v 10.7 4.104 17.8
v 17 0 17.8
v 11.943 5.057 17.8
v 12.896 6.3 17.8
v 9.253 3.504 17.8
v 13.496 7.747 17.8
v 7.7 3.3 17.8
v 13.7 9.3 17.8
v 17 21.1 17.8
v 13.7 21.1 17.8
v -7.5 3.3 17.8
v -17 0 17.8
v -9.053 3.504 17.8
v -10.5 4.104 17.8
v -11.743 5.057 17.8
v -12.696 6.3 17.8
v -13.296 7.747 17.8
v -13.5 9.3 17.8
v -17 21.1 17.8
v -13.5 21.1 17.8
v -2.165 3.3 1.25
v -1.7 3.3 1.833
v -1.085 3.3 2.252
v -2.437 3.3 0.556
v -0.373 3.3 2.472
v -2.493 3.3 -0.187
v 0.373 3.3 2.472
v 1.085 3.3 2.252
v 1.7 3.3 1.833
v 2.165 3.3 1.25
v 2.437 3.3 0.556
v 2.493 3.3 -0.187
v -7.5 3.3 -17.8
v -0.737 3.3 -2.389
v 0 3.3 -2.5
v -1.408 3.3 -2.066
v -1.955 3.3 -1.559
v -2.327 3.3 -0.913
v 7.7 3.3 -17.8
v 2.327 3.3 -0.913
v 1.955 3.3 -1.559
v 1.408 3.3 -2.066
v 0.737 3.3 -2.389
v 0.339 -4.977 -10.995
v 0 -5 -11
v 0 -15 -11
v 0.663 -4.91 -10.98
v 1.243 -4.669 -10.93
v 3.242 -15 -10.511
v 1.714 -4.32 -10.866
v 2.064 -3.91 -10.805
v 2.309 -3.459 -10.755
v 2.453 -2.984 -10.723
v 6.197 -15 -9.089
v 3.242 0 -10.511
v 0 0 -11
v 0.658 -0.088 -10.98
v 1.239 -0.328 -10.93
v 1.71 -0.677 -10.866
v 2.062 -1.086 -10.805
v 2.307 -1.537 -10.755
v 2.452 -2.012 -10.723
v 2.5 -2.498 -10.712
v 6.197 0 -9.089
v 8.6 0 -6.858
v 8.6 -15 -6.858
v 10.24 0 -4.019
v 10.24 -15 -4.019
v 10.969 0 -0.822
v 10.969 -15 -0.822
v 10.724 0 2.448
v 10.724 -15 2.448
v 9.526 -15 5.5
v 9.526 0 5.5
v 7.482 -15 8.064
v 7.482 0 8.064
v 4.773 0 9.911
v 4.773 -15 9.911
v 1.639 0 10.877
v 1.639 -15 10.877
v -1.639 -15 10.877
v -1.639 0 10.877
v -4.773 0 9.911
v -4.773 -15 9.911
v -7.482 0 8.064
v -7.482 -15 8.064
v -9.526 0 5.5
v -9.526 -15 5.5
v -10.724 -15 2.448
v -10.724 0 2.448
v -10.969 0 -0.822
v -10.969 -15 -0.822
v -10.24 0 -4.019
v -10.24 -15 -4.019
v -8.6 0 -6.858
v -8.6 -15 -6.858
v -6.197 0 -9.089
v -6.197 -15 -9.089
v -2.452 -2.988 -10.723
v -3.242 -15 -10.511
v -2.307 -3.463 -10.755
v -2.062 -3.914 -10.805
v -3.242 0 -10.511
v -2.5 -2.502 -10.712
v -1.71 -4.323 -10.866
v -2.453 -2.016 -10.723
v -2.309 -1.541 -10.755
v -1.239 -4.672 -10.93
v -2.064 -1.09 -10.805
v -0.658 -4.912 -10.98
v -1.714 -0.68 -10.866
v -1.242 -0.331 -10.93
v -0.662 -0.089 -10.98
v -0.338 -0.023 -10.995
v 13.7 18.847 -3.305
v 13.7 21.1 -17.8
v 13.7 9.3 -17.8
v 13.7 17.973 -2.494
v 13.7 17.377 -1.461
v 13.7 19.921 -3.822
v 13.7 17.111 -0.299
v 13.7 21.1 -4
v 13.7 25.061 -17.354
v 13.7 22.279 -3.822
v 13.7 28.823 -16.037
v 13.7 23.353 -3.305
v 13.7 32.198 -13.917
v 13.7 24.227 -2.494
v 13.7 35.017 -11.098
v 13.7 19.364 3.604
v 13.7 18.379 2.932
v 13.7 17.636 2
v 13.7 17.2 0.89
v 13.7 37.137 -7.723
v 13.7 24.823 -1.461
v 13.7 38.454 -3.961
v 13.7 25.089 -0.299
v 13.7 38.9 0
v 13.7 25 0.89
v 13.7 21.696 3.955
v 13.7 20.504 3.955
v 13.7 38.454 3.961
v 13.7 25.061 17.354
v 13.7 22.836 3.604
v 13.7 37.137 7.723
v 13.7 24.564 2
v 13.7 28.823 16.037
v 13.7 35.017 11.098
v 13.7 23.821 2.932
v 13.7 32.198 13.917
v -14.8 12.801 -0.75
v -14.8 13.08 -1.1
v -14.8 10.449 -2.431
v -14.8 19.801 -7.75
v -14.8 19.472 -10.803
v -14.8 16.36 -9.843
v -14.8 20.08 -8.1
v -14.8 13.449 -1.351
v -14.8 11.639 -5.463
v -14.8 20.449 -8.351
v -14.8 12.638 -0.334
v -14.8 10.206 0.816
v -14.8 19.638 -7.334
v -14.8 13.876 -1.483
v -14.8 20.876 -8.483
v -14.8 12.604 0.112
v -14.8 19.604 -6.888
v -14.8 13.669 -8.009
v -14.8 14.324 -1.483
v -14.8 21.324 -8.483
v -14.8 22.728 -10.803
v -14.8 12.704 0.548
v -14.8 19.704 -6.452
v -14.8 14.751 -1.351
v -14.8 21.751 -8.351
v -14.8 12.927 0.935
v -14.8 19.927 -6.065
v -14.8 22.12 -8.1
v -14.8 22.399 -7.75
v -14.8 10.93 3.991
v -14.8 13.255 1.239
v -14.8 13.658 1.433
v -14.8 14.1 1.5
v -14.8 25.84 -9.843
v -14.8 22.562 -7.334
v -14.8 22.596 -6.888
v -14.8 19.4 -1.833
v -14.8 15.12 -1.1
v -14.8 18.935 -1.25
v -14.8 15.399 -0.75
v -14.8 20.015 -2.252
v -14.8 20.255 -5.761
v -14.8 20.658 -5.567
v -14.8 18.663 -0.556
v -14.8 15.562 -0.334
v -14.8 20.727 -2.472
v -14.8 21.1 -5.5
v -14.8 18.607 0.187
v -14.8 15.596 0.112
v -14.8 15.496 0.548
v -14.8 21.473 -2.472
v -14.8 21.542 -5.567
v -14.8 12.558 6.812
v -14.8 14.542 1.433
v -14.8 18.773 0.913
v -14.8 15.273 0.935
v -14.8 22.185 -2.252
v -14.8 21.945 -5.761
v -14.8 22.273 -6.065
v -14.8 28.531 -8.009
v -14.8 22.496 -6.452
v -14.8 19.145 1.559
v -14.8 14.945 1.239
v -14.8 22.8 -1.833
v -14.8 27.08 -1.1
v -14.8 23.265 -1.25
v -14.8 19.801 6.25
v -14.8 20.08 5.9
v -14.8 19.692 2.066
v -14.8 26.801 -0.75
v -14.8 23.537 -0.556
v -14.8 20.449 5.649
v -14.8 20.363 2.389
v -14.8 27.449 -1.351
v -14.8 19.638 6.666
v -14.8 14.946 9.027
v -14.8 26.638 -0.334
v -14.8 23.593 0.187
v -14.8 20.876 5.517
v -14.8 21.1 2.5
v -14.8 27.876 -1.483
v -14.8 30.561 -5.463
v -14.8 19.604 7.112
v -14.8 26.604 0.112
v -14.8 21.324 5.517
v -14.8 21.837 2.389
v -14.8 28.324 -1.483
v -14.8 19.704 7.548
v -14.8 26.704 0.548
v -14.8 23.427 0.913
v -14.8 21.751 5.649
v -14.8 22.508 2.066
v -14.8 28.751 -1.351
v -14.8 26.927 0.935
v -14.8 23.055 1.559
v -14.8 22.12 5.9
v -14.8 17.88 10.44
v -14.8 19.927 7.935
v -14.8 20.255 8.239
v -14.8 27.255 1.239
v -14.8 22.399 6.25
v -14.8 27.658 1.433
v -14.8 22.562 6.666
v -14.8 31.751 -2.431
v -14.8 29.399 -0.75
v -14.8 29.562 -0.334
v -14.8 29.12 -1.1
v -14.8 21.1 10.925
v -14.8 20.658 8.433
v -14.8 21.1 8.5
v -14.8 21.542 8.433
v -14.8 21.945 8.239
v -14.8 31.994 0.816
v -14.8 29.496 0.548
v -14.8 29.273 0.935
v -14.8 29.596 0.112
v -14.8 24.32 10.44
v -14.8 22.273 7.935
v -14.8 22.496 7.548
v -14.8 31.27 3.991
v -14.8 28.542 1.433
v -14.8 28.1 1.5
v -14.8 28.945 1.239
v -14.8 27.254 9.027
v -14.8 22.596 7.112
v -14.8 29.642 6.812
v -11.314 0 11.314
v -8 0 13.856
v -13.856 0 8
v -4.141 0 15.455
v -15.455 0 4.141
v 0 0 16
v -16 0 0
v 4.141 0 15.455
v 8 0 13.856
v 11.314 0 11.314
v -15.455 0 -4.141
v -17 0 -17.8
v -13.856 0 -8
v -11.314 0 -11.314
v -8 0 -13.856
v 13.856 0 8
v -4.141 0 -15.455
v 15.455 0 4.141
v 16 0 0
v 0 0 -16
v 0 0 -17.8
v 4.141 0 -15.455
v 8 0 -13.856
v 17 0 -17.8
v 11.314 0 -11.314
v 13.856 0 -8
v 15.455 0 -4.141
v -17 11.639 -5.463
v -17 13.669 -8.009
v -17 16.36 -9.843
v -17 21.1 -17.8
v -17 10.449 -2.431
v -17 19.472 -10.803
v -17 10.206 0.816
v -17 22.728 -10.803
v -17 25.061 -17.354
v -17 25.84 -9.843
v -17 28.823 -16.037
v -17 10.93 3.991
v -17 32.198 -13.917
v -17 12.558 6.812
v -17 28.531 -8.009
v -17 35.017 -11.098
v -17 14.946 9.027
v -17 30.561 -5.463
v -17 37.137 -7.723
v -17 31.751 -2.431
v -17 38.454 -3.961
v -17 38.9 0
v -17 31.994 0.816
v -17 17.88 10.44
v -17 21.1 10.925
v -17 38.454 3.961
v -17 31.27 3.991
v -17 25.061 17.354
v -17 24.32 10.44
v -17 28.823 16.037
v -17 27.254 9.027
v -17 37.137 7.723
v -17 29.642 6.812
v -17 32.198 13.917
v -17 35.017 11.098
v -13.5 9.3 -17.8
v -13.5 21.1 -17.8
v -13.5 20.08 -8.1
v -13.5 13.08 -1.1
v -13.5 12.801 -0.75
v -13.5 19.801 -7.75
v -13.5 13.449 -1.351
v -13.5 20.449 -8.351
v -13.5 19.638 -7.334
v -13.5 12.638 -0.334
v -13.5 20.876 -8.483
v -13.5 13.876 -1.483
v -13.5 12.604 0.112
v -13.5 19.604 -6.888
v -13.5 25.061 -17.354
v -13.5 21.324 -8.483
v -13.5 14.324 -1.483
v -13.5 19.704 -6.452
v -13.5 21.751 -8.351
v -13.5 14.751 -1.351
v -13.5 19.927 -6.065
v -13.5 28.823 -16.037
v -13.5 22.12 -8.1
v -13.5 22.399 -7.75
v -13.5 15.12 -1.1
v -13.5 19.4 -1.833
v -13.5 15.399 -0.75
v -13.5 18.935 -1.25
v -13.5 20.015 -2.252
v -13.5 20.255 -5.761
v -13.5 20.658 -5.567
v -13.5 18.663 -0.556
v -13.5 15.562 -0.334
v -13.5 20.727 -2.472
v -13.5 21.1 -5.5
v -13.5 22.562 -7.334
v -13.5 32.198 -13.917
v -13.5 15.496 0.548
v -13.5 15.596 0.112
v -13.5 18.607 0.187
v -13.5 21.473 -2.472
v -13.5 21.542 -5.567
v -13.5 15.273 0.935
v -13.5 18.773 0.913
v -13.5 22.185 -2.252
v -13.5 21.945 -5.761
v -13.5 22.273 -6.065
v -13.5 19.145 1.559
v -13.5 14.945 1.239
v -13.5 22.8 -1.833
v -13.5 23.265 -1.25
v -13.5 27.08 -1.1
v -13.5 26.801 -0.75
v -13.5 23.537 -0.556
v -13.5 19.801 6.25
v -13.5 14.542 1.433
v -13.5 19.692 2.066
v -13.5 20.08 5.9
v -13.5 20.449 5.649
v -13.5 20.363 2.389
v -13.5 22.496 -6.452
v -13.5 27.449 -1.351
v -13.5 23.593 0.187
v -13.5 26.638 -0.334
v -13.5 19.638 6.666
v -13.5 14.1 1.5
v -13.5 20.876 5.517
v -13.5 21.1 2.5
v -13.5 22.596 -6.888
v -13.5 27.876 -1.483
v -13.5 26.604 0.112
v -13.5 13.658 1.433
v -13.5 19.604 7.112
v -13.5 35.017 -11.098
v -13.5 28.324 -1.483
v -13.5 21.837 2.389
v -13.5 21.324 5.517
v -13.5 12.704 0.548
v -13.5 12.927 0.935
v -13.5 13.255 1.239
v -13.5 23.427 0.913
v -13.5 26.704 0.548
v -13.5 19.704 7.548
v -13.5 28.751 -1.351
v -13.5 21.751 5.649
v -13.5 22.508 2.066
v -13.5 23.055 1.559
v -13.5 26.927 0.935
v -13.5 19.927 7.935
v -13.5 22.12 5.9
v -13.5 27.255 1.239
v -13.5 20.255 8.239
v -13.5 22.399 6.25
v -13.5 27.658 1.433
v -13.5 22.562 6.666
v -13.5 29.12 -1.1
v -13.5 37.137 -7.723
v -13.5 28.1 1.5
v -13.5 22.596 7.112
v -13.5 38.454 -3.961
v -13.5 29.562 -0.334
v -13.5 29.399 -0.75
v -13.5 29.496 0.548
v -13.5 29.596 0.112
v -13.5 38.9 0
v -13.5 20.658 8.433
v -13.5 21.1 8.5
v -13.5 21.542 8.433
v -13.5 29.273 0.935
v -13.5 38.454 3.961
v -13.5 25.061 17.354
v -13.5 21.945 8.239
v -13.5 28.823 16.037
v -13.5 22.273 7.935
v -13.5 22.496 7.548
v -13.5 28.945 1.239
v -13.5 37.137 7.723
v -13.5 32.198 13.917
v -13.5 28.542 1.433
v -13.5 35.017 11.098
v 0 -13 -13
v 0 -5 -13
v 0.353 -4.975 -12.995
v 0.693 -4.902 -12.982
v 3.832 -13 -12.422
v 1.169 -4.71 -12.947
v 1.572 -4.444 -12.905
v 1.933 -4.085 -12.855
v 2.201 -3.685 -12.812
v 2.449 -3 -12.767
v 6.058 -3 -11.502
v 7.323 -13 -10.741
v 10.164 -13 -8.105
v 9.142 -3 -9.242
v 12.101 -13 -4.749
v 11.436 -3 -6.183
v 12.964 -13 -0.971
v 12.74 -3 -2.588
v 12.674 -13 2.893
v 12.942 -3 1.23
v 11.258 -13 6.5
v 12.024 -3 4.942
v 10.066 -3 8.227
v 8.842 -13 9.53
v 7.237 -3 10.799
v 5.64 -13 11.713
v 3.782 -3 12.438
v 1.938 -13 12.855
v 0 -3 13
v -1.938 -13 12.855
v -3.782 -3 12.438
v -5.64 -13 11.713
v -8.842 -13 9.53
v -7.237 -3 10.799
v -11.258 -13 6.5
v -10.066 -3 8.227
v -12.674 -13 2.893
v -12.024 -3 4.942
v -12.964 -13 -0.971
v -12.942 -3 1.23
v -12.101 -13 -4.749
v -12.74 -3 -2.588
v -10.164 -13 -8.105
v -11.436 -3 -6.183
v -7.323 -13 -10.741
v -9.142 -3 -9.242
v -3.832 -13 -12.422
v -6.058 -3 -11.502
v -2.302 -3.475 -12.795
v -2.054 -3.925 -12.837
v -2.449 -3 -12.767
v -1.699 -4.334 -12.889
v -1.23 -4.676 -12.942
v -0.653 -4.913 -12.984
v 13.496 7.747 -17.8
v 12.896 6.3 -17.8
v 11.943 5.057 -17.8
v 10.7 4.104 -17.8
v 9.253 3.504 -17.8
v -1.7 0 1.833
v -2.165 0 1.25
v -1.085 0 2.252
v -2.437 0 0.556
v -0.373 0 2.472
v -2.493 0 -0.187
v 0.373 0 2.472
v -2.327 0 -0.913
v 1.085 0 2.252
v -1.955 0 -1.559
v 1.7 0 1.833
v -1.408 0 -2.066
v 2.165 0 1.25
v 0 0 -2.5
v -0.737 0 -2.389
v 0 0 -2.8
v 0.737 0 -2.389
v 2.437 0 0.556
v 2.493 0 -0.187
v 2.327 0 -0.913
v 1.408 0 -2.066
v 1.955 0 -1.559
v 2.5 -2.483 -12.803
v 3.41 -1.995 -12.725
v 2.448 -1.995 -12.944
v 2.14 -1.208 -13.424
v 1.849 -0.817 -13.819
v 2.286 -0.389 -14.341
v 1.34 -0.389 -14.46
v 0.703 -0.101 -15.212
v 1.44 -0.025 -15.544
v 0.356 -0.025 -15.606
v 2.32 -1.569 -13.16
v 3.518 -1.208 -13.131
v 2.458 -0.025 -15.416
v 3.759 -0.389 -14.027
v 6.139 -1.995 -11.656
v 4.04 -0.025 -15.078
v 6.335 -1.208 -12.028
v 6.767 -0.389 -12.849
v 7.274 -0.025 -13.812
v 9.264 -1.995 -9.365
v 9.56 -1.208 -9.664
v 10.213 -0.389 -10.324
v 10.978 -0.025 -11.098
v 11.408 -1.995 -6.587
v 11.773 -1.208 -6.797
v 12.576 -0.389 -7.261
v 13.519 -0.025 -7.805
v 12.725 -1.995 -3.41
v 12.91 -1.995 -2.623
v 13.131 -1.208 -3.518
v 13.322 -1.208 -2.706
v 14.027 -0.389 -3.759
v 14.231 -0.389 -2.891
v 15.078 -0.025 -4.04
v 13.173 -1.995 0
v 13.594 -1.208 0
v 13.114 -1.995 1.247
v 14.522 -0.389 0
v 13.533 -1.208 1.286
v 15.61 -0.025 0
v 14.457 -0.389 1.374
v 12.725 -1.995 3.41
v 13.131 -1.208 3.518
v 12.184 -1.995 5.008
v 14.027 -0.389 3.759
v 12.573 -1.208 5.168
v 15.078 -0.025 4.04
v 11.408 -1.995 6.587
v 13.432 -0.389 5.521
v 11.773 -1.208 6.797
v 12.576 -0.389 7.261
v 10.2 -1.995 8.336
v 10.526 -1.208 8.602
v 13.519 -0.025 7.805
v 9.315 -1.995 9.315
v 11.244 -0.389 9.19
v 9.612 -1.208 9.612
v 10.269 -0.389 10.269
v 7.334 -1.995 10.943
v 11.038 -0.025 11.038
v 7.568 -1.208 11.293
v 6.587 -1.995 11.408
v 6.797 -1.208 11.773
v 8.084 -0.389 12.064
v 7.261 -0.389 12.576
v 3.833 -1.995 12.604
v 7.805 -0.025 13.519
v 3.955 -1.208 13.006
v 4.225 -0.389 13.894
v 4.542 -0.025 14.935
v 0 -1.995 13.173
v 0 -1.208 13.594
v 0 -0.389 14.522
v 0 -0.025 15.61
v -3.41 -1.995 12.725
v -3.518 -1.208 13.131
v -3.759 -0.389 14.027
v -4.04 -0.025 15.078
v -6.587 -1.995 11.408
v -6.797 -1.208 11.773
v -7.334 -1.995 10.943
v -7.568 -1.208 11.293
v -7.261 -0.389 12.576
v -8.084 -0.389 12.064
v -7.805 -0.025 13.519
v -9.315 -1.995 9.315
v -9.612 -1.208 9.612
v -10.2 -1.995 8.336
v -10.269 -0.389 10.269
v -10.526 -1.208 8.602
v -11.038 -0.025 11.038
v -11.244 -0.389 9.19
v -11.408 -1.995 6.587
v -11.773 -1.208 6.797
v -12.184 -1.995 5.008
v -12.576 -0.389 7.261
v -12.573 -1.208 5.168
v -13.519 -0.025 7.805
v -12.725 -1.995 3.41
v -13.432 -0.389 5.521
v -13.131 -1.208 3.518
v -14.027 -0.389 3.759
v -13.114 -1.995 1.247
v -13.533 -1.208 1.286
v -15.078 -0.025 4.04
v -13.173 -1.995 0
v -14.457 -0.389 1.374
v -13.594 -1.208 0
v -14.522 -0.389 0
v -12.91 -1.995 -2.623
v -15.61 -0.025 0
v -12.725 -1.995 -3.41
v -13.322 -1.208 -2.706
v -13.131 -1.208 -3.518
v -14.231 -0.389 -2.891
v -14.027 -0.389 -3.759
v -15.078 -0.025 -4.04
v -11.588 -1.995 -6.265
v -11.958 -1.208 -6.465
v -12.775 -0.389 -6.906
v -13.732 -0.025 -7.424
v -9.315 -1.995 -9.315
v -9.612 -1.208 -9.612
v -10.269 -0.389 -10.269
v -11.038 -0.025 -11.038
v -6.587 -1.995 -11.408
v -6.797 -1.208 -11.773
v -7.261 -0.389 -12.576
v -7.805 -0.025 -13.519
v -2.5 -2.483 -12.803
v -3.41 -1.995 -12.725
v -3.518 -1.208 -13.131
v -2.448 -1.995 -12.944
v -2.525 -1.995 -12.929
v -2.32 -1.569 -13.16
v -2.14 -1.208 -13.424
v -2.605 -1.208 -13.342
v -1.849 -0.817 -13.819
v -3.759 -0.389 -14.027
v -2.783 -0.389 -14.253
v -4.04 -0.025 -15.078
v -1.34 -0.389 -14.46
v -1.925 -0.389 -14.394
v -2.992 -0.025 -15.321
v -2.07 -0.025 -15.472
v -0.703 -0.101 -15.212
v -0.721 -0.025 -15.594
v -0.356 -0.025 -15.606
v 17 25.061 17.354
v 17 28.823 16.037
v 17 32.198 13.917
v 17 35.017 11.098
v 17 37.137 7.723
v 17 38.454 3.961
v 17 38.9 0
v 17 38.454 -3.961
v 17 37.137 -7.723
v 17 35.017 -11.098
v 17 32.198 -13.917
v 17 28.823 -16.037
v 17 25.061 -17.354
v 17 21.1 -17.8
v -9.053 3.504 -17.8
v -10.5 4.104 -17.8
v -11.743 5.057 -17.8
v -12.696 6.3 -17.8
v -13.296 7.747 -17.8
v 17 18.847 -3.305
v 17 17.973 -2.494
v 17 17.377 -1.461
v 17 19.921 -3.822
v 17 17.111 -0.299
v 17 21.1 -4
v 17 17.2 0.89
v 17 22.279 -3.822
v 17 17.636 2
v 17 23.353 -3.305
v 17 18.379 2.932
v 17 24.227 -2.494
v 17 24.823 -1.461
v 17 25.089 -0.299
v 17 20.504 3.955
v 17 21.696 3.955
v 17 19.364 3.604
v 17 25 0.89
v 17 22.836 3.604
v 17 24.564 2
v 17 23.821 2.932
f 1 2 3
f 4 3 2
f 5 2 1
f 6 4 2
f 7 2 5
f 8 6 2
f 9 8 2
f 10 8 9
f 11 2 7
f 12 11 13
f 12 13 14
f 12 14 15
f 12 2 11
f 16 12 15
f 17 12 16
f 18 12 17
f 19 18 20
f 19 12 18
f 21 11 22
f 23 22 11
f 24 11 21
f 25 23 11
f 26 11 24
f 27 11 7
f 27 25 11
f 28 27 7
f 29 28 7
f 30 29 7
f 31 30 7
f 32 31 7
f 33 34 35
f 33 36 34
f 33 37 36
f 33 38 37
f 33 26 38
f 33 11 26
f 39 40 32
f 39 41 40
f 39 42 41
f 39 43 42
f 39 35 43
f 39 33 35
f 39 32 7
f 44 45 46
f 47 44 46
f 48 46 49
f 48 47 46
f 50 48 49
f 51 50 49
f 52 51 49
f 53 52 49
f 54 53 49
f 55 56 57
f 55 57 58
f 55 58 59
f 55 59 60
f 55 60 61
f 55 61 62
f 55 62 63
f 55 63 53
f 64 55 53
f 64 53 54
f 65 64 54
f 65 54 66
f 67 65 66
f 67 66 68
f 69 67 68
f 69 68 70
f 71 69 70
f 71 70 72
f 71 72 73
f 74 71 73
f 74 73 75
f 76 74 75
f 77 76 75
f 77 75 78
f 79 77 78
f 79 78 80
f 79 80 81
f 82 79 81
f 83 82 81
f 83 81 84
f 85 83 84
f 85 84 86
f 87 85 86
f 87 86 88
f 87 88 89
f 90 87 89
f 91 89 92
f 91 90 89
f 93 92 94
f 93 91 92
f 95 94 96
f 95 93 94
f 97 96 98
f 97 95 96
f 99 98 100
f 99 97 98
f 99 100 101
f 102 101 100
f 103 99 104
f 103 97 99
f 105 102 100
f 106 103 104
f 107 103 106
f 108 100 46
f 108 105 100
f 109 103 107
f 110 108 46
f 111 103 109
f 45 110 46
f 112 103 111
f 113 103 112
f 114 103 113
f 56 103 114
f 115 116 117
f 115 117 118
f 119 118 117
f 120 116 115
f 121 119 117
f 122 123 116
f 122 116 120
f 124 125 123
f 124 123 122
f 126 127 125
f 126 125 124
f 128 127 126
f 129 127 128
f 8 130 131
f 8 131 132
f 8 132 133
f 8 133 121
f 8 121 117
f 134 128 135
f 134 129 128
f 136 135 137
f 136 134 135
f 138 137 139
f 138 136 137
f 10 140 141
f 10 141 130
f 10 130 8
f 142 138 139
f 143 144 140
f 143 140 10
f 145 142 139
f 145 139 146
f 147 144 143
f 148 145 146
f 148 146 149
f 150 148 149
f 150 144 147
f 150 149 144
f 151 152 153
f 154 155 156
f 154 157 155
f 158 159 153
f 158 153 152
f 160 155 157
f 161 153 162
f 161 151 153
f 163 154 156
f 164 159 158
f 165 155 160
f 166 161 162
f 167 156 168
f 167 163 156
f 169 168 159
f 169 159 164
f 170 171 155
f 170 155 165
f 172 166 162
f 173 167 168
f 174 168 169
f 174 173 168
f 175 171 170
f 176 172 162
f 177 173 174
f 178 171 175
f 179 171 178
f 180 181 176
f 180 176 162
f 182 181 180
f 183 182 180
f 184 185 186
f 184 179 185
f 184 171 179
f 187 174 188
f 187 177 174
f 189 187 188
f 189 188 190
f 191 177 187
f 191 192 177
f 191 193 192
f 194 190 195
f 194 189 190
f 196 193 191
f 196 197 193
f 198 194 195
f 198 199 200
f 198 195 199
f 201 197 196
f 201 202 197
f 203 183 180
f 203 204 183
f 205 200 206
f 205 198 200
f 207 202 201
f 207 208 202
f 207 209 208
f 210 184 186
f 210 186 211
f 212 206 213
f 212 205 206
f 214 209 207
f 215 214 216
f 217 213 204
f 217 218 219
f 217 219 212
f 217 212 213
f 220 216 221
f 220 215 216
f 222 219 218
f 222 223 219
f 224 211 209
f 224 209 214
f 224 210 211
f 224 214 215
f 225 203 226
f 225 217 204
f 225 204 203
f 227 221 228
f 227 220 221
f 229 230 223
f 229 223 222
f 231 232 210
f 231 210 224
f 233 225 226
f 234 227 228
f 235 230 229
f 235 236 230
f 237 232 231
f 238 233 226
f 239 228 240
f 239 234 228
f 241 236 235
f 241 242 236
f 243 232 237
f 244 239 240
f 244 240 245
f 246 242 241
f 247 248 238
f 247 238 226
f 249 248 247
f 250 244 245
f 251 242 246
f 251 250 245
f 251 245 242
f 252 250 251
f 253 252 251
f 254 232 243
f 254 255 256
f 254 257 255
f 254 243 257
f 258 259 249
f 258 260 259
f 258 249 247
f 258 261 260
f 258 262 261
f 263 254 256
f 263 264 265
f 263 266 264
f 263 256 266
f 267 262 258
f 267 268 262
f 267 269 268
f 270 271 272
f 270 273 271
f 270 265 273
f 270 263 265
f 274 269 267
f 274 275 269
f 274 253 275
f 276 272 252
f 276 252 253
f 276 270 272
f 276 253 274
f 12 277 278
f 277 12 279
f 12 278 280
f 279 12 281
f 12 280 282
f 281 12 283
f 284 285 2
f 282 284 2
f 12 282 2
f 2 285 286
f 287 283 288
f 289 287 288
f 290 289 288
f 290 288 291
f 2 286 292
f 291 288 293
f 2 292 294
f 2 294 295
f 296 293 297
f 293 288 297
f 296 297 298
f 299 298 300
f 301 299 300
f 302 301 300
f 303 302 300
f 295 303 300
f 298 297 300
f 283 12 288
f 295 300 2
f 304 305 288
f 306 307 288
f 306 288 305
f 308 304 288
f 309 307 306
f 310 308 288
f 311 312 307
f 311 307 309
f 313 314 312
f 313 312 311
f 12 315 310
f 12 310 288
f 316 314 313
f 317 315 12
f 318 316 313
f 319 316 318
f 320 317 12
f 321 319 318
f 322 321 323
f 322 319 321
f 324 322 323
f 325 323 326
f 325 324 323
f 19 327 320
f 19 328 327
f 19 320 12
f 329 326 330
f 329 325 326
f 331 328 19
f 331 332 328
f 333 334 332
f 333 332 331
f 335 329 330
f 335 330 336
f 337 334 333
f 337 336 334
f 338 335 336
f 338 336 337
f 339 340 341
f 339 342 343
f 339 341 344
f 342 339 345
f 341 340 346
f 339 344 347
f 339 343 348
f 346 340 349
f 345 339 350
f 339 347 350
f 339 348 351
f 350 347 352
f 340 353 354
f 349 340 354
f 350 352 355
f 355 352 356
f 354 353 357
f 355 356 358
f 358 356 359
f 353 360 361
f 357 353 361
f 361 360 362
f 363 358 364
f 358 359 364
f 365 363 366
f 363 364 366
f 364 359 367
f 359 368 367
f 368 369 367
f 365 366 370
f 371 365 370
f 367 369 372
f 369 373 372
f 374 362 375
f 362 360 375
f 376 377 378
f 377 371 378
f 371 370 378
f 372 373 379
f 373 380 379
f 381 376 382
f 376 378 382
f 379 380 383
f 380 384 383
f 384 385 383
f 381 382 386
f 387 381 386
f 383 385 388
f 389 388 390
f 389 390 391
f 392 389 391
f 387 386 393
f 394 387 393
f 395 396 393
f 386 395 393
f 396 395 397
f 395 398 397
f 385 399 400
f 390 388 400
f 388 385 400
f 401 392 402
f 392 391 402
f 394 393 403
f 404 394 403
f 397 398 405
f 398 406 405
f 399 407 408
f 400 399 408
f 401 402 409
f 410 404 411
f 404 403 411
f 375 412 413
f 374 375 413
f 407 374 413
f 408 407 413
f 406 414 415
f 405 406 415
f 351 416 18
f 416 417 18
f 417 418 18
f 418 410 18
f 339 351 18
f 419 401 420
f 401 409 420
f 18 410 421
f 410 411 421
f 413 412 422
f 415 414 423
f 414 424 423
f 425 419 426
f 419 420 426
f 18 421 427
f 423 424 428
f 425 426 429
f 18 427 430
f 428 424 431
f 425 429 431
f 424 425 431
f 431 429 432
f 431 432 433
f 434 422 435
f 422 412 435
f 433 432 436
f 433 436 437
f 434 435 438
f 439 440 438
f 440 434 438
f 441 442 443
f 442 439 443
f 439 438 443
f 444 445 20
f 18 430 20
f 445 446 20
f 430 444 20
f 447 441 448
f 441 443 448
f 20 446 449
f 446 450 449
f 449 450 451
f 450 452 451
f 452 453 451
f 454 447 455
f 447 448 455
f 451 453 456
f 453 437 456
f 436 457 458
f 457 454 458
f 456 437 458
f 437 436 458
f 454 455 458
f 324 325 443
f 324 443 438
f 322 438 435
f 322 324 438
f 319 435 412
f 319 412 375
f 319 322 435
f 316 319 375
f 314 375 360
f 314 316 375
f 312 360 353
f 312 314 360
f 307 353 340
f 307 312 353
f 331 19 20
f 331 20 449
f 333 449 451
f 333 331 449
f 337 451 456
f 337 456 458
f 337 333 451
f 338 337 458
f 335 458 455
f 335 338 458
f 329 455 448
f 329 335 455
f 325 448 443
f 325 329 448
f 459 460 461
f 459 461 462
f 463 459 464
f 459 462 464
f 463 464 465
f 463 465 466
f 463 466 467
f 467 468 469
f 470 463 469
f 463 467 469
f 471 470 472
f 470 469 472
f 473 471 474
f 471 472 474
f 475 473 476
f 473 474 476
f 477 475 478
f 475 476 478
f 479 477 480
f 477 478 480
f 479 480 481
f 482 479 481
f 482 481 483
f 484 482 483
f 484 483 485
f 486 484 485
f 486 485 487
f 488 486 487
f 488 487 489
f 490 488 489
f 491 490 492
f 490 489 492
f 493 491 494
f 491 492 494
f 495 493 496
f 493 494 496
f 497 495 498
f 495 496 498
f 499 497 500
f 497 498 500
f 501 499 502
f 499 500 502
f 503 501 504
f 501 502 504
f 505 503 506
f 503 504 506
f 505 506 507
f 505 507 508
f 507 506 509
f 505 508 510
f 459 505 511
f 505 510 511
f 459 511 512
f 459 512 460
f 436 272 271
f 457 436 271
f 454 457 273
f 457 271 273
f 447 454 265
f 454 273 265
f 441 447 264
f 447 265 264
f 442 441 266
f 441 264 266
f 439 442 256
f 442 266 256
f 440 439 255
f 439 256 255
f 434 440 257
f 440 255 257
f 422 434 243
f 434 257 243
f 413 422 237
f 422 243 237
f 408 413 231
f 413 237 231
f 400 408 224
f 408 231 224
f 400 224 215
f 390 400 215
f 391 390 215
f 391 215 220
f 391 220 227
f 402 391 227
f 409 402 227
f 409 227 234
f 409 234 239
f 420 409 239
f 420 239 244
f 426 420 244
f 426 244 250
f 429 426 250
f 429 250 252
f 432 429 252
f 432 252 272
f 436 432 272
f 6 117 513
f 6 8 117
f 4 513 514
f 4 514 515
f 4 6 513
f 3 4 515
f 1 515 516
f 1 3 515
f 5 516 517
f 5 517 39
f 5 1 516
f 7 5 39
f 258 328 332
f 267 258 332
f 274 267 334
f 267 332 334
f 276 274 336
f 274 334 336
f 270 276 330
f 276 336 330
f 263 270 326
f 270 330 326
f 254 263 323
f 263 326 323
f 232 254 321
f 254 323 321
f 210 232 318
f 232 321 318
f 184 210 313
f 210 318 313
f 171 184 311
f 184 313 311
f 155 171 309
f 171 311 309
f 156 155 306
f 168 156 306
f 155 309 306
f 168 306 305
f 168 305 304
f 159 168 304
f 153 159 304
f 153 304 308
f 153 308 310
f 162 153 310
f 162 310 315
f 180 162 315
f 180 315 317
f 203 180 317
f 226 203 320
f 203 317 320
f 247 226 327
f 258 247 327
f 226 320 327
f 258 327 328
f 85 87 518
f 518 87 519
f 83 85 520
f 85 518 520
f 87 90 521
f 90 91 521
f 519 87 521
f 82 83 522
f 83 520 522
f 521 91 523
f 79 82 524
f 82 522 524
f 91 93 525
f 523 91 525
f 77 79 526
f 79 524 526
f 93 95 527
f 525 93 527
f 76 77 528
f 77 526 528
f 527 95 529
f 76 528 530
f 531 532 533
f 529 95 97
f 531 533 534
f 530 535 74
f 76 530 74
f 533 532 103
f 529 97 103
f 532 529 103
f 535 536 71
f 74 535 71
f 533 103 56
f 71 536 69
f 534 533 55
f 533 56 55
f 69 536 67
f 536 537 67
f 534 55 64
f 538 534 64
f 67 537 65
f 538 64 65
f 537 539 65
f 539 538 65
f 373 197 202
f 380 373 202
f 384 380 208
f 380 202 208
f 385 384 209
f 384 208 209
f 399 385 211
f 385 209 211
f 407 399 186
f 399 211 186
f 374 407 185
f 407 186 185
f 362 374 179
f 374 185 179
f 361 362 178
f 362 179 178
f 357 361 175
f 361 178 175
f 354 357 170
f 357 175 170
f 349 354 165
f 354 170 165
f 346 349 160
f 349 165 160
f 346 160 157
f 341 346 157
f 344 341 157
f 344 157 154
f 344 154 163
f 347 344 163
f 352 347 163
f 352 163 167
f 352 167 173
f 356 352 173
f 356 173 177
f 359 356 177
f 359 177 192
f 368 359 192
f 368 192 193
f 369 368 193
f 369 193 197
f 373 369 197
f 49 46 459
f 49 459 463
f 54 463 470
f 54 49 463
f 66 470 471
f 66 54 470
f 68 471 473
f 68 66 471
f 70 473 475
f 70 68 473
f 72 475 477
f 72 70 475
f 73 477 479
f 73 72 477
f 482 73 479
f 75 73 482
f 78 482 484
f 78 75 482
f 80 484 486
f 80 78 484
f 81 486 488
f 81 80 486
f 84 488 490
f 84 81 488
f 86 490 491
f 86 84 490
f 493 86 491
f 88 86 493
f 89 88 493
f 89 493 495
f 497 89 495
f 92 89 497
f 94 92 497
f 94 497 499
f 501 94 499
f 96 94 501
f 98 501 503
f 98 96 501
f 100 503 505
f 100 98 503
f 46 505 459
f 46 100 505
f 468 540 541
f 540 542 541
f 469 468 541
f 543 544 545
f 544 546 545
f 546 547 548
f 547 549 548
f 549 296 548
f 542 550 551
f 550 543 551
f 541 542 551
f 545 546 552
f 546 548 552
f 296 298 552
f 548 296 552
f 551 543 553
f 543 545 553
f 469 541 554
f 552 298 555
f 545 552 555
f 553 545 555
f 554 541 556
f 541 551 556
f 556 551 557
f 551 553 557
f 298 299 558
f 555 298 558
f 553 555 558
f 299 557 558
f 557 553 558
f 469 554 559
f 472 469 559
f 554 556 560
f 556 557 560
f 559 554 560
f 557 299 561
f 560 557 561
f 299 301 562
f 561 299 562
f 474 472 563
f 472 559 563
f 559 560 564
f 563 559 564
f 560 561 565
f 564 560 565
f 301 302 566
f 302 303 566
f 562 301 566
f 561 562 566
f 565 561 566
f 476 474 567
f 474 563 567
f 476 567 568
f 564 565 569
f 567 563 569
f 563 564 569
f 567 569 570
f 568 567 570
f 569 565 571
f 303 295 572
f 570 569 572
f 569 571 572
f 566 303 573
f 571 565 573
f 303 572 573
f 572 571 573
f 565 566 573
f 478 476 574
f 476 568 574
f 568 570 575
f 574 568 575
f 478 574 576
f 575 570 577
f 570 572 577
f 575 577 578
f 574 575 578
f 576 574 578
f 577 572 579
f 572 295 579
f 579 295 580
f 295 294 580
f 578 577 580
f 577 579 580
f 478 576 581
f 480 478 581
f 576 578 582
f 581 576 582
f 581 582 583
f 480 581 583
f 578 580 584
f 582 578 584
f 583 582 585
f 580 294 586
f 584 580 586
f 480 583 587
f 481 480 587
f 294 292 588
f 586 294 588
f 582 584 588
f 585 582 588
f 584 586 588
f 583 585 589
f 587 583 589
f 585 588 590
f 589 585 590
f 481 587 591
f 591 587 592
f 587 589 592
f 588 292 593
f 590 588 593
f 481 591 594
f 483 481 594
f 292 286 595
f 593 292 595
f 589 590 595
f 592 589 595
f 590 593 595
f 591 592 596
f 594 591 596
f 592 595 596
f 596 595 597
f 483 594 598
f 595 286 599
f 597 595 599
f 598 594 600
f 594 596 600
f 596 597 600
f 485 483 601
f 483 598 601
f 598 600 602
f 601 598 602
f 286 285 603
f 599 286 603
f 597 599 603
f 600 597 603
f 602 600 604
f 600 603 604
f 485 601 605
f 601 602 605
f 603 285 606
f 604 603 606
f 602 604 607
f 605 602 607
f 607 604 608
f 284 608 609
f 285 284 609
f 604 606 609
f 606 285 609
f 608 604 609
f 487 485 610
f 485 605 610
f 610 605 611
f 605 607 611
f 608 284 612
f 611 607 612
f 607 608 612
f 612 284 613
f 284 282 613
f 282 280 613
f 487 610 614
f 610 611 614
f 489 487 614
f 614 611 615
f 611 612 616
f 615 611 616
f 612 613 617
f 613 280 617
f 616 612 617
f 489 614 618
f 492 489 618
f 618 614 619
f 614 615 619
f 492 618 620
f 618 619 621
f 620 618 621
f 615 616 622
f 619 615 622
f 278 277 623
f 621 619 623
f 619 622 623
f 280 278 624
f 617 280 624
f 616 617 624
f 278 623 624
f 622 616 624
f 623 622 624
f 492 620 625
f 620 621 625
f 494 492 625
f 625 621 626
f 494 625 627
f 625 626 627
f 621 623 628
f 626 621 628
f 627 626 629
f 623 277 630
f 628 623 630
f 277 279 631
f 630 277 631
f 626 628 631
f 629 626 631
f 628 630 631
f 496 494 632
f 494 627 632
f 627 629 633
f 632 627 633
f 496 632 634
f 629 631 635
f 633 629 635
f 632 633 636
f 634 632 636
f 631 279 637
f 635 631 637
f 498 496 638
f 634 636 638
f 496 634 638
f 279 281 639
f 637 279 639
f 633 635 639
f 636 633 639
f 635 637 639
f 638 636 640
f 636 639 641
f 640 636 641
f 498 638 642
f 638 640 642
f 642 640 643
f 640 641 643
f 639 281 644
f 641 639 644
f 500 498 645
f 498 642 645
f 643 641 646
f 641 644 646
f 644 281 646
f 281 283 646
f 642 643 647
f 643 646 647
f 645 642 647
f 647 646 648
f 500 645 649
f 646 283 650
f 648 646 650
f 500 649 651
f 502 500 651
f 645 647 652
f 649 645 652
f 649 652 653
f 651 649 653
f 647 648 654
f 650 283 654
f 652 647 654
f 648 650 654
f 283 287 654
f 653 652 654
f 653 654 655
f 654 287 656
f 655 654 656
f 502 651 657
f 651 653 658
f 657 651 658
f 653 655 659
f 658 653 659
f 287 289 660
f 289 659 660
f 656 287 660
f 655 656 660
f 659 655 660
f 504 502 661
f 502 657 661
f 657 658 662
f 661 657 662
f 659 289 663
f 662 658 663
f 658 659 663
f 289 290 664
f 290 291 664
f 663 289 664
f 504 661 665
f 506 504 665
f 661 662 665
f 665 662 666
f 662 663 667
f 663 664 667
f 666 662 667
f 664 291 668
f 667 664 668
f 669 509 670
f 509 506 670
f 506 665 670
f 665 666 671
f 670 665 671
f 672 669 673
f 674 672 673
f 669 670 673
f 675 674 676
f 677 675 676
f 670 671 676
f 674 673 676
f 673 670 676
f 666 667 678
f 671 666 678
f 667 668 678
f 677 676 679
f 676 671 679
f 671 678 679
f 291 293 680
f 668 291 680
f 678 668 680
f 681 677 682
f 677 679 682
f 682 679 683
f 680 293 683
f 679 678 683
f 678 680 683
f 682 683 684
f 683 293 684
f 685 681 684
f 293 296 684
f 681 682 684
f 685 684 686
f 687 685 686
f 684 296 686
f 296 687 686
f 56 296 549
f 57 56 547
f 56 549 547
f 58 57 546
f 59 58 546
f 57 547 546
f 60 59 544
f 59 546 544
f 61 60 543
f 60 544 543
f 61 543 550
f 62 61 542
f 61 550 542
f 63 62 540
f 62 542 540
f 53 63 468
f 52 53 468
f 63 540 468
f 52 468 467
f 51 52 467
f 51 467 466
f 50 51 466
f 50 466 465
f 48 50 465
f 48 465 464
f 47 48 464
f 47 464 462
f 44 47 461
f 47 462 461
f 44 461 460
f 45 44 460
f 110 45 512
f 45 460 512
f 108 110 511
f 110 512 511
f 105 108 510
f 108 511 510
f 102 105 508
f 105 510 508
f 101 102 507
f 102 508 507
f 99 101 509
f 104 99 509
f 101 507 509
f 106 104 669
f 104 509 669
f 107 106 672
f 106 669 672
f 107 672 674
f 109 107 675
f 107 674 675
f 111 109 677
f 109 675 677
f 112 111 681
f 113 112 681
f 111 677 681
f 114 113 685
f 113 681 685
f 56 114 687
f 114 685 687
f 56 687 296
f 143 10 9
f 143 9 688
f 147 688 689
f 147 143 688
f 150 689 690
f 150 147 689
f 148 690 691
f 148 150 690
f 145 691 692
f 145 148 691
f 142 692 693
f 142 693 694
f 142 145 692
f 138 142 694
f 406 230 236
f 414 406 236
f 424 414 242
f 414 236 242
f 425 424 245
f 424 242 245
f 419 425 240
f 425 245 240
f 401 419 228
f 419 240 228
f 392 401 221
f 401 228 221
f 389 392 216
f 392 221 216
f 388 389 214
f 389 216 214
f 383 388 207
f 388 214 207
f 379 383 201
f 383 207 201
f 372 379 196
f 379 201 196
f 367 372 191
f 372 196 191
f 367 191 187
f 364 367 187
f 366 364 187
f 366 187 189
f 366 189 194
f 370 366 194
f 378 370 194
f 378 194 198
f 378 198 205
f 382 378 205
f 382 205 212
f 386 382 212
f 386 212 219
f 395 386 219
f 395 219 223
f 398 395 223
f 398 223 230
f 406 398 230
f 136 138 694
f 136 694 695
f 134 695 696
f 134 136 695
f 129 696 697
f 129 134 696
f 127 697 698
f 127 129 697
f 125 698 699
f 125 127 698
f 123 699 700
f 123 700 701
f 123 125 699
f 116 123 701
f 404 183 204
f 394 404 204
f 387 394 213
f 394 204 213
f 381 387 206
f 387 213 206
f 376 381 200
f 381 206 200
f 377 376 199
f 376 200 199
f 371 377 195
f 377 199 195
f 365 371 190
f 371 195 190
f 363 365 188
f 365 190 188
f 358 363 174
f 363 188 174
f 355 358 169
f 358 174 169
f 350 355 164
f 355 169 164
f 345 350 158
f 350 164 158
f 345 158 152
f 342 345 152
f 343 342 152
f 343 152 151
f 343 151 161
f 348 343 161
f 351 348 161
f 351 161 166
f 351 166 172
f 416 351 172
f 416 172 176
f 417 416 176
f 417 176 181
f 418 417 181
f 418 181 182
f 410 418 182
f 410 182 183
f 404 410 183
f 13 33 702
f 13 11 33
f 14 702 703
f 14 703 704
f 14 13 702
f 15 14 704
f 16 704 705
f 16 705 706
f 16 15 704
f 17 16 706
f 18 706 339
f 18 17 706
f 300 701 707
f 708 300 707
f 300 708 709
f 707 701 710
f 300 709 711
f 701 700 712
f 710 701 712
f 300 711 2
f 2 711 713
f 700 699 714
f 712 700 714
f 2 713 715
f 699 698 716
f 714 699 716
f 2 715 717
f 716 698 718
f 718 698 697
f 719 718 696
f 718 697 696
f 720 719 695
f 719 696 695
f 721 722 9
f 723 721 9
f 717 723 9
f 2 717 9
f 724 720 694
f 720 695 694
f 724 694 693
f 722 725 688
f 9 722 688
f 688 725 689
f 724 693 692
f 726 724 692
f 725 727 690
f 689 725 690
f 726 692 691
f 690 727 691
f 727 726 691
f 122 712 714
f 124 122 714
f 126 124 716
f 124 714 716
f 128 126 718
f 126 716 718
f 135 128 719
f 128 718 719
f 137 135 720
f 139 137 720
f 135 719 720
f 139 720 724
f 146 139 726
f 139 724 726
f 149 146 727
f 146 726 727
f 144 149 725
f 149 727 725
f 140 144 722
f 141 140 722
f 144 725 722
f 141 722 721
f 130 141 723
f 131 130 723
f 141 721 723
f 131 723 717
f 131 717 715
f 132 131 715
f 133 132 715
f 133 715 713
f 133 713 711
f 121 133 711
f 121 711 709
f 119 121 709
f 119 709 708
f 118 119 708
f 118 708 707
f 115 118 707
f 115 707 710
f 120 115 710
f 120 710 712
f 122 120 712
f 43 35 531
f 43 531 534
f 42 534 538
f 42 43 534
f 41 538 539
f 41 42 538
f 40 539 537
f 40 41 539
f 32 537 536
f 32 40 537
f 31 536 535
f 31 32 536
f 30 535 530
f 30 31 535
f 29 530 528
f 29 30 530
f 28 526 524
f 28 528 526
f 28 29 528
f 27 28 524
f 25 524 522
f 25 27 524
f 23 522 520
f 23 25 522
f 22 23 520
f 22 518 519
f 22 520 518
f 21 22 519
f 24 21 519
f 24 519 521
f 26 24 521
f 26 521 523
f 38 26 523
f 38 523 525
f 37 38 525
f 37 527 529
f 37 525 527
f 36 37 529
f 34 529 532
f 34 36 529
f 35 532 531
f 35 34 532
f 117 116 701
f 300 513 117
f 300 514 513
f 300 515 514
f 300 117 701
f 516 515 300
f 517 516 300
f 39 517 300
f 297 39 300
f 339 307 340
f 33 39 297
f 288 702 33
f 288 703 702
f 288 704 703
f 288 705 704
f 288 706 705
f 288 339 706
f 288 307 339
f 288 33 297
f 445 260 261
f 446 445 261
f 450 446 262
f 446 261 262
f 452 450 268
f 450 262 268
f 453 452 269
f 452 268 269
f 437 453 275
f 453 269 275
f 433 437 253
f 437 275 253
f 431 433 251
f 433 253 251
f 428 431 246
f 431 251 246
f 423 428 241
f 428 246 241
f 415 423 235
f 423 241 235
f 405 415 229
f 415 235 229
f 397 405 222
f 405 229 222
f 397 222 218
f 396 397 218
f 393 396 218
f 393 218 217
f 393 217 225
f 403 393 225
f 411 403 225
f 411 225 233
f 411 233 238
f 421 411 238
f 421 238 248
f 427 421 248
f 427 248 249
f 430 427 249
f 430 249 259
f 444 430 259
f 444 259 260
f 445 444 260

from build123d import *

# Parameters (mm, degrees)
SKETCH1_W               = 34
SKETCH1_H               = 35.6
BOSS_EXTRUDE1_DEPTH     = 3.3
BOSS_EXTRUDE2_DEPTH     = 3.5
BOSS_EXTRUDE3_START     = -30.7
BOSS_EXTRUDE3_DEPTH     = 3.3
SKETCH4_R               = 2.5
SKETCH4_R_2             = 1.5
CUT_EXTRUDE1_DEPTH      = 12
SKETCH4_3_R             = 10.925
SKETCH4_3_R_2           = 1.5
SKETCH4_3_R_3           = 2.5
CUT_EXTRUDE2_DEPTH      = 2.2
SKETCH5_R               = 4
CUT_EXTRUDE3_DEPTH      = 12.2
CUT_EXTRUDE4_DEPTH      = 47.033140236
CUT_EXTRUDE4_DEPTH_BACK = 47.033140236
SKETCH6_R               = 2.5
FILLET1_R               = 6
SKETCH7_R               = 13
SKETCH7_R_2             = 11
BOSS_EXTRUDE4_DEPTH     = 15
CHAMFER1_SIZE           = 2
FILLET2_R               = 3
SKETCH9_R               = 2.5
CUT_EXTRUDE5_DEPTH      = 15


with BuildPart() as part:
    # Sketch1 → Boss-Extrude1 (new body)
    with BuildSketch(Plane(origin=(0, 0, 0), x_dir=(1, 0, 0), z_dir=(0, 1, 0))):
        Rectangle(SKETCH1_W, SKETCH1_H)
    extrude(amount=BOSS_EXTRUDE1_DEPTH)

    # Sketch3 → Boss-Extrude2 (add)
    with BuildSketch(Plane.ZY.offset(17)):
        with BuildLine():
            Line((0, 38.9), (0, 3.3))
            Line((0, 3.3), (17.8, 3.3))
            Line((17.8, 3.3), (17.8, 21.1))
            ThreePointArc((17.8, 21.1), (12.586500705, 33.686500705), (0, 38.9))
        make_face()
        with BuildLine():
            Line((-17.8, 3.3), (0, 3.3))
            Line((0, 3.3), (0, 38.9))
            ThreePointArc((0, 38.9), (-12.586500705, 33.686500705), (-17.8, 21.1))
            Line((-17.8, 21.1), (-17.8, 3.3))
        make_face()
    extrude(amount=-BOSS_EXTRUDE2_DEPTH)

    # Sketch3<4> → Boss-Extrude3 (add)
    with BuildSketch(Plane.ZY.offset(17).offset(BOSS_EXTRUDE3_START)):
        with BuildLine():
            Line((-17.8, 3.3), (0, 3.3))
            Line((0, 3.3), (0, 38.9))
            ThreePointArc((0, 38.9), (-12.586500705, 33.686500705), (-17.8, 21.1))
            Line((-17.8, 21.1), (-17.8, 3.3))
        make_face()
        with BuildLine():
            Line((0, 38.9), (0, 3.3))
            Line((0, 3.3), (17.8, 3.3))
            Line((17.8, 3.3), (17.8, 21.1))
            ThreePointArc((17.8, 21.1), (12.586500705, 33.686500705), (0, 38.9))
        make_face()
    extrude(amount=-BOSS_EXTRUDE3_DEPTH)

    # Sketch4 → Cut-Extrude1 (cut)
    with BuildSketch(Plane.ZY.offset(17)):
        with Locations((0, 21.1)):
            Circle(SKETCH4_R)
        with Locations((7, 21.1)):
            Circle(SKETCH4_R_2)
        with Locations((0, 28.1)):
            Circle(SKETCH4_R_2)
        with Locations((-7, 21.1)):
            Circle(SKETCH4_R_2)
        with Locations((0, 14.1)):
            Circle(SKETCH4_R_2)
    extrude(amount=-CUT_EXTRUDE1_DEPTH, mode=Mode.SUBTRACT)

    # Sketch4<3> → Cut-Extrude2 (cut)
    with BuildSketch(Plane.ZY.offset(17)):
        with Locations((0, 21.1)):
            Circle(SKETCH4_3_R)
        with Locations((0, 28.1)):
            Circle(SKETCH4_3_R_2, mode=Mode.SUBTRACT)
        with Locations((0, 14.1)):
            Circle(SKETCH4_3_R_2, mode=Mode.SUBTRACT)
        with Locations((-7, 21.1)):
            Circle(SKETCH4_3_R_2, mode=Mode.SUBTRACT)
        with Locations((7, 21.1)):
            Circle(SKETCH4_3_R_2, mode=Mode.SUBTRACT)
        with Locations((0, 21.1)):
            Circle(SKETCH4_3_R_3, mode=Mode.SUBTRACT)
    extrude(amount=-CUT_EXTRUDE2_DEPTH, mode=Mode.SUBTRACT)

    # Sketch5 → Cut-Extrude3 (cut)
    with BuildSketch(Plane(origin=(17, 0, 0), x_dir=(0, 0, -1), z_dir=(1, 0, 0))):
        with Locations((0, 21.1)):
            Circle(SKETCH5_R)
    extrude(amount=-CUT_EXTRUDE3_DEPTH, mode=Mode.SUBTRACT)

    # Sketch6 → Cut-Extrude4 (cut, two sides: drawn at the far end of the back side and taken through both)
    with BuildSketch(Plane.XZ.offset(-CUT_EXTRUDE4_DEPTH_BACK)):
        with Locations(Location((0, 0, 0), (0, 0, 270))):
            Circle(SKETCH6_R)
    extrude(amount=CUT_EXTRUDE4_DEPTH + CUT_EXTRUDE4_DEPTH_BACK, mode=Mode.SUBTRACT)

    # Fillet1
    fillet1_edges = [part.edges().sort_by_distance(p)[0] for p in [
        (-13.5, 3.3, 0),
        (13.7, 3.3, 0),
    ]]
    fillet(fillet1_edges, radius=FILLET1_R)

    # Sketch7 → Boss-Extrude4 (add)
    with BuildSketch(Plane.XZ):
        with Locations(Location((0, 0, 0), (0, 0, 270))):
            Circle(SKETCH7_R)
        with Locations(Location((0, 0, 0), (0, 0, 270))):
            Circle(SKETCH7_R_2, mode=Mode.SUBTRACT)
    extrude(amount=BOSS_EXTRUDE4_DEPTH)

    # Chamfer1
    chamfer1_edges = [part.edges().sort_by_distance(p)[0] for p in [
        (0, -15, 13),
    ]]
    chamfer(chamfer1_edges, length=CHAMFER1_SIZE - 0.0001)  # a hair under: the kernel refuses the full size

    # Fillet2
    fillet2_edges = [part.edges().sort_by_distance(p)[0] for p in [
        (0, 0, 13),
    ]]
    fillet(fillet2_edges, radius=FILLET2_R)

    # Sketch9 → Cut-Extrude5 (cut)
    with BuildSketch(Plane(origin=(0, 0, -17.8), x_dir=(-1, 0, 0), z_dir=(0, 0, -1))):
        with Locations(Location((0, -2.5, 0), (0, 0, 90))):
            Circle(SKETCH9_R)
    extrude(amount=-CUT_EXTRUDE5_DEPTH, mode=Mode.SUBTRACT)


solid = part.part
